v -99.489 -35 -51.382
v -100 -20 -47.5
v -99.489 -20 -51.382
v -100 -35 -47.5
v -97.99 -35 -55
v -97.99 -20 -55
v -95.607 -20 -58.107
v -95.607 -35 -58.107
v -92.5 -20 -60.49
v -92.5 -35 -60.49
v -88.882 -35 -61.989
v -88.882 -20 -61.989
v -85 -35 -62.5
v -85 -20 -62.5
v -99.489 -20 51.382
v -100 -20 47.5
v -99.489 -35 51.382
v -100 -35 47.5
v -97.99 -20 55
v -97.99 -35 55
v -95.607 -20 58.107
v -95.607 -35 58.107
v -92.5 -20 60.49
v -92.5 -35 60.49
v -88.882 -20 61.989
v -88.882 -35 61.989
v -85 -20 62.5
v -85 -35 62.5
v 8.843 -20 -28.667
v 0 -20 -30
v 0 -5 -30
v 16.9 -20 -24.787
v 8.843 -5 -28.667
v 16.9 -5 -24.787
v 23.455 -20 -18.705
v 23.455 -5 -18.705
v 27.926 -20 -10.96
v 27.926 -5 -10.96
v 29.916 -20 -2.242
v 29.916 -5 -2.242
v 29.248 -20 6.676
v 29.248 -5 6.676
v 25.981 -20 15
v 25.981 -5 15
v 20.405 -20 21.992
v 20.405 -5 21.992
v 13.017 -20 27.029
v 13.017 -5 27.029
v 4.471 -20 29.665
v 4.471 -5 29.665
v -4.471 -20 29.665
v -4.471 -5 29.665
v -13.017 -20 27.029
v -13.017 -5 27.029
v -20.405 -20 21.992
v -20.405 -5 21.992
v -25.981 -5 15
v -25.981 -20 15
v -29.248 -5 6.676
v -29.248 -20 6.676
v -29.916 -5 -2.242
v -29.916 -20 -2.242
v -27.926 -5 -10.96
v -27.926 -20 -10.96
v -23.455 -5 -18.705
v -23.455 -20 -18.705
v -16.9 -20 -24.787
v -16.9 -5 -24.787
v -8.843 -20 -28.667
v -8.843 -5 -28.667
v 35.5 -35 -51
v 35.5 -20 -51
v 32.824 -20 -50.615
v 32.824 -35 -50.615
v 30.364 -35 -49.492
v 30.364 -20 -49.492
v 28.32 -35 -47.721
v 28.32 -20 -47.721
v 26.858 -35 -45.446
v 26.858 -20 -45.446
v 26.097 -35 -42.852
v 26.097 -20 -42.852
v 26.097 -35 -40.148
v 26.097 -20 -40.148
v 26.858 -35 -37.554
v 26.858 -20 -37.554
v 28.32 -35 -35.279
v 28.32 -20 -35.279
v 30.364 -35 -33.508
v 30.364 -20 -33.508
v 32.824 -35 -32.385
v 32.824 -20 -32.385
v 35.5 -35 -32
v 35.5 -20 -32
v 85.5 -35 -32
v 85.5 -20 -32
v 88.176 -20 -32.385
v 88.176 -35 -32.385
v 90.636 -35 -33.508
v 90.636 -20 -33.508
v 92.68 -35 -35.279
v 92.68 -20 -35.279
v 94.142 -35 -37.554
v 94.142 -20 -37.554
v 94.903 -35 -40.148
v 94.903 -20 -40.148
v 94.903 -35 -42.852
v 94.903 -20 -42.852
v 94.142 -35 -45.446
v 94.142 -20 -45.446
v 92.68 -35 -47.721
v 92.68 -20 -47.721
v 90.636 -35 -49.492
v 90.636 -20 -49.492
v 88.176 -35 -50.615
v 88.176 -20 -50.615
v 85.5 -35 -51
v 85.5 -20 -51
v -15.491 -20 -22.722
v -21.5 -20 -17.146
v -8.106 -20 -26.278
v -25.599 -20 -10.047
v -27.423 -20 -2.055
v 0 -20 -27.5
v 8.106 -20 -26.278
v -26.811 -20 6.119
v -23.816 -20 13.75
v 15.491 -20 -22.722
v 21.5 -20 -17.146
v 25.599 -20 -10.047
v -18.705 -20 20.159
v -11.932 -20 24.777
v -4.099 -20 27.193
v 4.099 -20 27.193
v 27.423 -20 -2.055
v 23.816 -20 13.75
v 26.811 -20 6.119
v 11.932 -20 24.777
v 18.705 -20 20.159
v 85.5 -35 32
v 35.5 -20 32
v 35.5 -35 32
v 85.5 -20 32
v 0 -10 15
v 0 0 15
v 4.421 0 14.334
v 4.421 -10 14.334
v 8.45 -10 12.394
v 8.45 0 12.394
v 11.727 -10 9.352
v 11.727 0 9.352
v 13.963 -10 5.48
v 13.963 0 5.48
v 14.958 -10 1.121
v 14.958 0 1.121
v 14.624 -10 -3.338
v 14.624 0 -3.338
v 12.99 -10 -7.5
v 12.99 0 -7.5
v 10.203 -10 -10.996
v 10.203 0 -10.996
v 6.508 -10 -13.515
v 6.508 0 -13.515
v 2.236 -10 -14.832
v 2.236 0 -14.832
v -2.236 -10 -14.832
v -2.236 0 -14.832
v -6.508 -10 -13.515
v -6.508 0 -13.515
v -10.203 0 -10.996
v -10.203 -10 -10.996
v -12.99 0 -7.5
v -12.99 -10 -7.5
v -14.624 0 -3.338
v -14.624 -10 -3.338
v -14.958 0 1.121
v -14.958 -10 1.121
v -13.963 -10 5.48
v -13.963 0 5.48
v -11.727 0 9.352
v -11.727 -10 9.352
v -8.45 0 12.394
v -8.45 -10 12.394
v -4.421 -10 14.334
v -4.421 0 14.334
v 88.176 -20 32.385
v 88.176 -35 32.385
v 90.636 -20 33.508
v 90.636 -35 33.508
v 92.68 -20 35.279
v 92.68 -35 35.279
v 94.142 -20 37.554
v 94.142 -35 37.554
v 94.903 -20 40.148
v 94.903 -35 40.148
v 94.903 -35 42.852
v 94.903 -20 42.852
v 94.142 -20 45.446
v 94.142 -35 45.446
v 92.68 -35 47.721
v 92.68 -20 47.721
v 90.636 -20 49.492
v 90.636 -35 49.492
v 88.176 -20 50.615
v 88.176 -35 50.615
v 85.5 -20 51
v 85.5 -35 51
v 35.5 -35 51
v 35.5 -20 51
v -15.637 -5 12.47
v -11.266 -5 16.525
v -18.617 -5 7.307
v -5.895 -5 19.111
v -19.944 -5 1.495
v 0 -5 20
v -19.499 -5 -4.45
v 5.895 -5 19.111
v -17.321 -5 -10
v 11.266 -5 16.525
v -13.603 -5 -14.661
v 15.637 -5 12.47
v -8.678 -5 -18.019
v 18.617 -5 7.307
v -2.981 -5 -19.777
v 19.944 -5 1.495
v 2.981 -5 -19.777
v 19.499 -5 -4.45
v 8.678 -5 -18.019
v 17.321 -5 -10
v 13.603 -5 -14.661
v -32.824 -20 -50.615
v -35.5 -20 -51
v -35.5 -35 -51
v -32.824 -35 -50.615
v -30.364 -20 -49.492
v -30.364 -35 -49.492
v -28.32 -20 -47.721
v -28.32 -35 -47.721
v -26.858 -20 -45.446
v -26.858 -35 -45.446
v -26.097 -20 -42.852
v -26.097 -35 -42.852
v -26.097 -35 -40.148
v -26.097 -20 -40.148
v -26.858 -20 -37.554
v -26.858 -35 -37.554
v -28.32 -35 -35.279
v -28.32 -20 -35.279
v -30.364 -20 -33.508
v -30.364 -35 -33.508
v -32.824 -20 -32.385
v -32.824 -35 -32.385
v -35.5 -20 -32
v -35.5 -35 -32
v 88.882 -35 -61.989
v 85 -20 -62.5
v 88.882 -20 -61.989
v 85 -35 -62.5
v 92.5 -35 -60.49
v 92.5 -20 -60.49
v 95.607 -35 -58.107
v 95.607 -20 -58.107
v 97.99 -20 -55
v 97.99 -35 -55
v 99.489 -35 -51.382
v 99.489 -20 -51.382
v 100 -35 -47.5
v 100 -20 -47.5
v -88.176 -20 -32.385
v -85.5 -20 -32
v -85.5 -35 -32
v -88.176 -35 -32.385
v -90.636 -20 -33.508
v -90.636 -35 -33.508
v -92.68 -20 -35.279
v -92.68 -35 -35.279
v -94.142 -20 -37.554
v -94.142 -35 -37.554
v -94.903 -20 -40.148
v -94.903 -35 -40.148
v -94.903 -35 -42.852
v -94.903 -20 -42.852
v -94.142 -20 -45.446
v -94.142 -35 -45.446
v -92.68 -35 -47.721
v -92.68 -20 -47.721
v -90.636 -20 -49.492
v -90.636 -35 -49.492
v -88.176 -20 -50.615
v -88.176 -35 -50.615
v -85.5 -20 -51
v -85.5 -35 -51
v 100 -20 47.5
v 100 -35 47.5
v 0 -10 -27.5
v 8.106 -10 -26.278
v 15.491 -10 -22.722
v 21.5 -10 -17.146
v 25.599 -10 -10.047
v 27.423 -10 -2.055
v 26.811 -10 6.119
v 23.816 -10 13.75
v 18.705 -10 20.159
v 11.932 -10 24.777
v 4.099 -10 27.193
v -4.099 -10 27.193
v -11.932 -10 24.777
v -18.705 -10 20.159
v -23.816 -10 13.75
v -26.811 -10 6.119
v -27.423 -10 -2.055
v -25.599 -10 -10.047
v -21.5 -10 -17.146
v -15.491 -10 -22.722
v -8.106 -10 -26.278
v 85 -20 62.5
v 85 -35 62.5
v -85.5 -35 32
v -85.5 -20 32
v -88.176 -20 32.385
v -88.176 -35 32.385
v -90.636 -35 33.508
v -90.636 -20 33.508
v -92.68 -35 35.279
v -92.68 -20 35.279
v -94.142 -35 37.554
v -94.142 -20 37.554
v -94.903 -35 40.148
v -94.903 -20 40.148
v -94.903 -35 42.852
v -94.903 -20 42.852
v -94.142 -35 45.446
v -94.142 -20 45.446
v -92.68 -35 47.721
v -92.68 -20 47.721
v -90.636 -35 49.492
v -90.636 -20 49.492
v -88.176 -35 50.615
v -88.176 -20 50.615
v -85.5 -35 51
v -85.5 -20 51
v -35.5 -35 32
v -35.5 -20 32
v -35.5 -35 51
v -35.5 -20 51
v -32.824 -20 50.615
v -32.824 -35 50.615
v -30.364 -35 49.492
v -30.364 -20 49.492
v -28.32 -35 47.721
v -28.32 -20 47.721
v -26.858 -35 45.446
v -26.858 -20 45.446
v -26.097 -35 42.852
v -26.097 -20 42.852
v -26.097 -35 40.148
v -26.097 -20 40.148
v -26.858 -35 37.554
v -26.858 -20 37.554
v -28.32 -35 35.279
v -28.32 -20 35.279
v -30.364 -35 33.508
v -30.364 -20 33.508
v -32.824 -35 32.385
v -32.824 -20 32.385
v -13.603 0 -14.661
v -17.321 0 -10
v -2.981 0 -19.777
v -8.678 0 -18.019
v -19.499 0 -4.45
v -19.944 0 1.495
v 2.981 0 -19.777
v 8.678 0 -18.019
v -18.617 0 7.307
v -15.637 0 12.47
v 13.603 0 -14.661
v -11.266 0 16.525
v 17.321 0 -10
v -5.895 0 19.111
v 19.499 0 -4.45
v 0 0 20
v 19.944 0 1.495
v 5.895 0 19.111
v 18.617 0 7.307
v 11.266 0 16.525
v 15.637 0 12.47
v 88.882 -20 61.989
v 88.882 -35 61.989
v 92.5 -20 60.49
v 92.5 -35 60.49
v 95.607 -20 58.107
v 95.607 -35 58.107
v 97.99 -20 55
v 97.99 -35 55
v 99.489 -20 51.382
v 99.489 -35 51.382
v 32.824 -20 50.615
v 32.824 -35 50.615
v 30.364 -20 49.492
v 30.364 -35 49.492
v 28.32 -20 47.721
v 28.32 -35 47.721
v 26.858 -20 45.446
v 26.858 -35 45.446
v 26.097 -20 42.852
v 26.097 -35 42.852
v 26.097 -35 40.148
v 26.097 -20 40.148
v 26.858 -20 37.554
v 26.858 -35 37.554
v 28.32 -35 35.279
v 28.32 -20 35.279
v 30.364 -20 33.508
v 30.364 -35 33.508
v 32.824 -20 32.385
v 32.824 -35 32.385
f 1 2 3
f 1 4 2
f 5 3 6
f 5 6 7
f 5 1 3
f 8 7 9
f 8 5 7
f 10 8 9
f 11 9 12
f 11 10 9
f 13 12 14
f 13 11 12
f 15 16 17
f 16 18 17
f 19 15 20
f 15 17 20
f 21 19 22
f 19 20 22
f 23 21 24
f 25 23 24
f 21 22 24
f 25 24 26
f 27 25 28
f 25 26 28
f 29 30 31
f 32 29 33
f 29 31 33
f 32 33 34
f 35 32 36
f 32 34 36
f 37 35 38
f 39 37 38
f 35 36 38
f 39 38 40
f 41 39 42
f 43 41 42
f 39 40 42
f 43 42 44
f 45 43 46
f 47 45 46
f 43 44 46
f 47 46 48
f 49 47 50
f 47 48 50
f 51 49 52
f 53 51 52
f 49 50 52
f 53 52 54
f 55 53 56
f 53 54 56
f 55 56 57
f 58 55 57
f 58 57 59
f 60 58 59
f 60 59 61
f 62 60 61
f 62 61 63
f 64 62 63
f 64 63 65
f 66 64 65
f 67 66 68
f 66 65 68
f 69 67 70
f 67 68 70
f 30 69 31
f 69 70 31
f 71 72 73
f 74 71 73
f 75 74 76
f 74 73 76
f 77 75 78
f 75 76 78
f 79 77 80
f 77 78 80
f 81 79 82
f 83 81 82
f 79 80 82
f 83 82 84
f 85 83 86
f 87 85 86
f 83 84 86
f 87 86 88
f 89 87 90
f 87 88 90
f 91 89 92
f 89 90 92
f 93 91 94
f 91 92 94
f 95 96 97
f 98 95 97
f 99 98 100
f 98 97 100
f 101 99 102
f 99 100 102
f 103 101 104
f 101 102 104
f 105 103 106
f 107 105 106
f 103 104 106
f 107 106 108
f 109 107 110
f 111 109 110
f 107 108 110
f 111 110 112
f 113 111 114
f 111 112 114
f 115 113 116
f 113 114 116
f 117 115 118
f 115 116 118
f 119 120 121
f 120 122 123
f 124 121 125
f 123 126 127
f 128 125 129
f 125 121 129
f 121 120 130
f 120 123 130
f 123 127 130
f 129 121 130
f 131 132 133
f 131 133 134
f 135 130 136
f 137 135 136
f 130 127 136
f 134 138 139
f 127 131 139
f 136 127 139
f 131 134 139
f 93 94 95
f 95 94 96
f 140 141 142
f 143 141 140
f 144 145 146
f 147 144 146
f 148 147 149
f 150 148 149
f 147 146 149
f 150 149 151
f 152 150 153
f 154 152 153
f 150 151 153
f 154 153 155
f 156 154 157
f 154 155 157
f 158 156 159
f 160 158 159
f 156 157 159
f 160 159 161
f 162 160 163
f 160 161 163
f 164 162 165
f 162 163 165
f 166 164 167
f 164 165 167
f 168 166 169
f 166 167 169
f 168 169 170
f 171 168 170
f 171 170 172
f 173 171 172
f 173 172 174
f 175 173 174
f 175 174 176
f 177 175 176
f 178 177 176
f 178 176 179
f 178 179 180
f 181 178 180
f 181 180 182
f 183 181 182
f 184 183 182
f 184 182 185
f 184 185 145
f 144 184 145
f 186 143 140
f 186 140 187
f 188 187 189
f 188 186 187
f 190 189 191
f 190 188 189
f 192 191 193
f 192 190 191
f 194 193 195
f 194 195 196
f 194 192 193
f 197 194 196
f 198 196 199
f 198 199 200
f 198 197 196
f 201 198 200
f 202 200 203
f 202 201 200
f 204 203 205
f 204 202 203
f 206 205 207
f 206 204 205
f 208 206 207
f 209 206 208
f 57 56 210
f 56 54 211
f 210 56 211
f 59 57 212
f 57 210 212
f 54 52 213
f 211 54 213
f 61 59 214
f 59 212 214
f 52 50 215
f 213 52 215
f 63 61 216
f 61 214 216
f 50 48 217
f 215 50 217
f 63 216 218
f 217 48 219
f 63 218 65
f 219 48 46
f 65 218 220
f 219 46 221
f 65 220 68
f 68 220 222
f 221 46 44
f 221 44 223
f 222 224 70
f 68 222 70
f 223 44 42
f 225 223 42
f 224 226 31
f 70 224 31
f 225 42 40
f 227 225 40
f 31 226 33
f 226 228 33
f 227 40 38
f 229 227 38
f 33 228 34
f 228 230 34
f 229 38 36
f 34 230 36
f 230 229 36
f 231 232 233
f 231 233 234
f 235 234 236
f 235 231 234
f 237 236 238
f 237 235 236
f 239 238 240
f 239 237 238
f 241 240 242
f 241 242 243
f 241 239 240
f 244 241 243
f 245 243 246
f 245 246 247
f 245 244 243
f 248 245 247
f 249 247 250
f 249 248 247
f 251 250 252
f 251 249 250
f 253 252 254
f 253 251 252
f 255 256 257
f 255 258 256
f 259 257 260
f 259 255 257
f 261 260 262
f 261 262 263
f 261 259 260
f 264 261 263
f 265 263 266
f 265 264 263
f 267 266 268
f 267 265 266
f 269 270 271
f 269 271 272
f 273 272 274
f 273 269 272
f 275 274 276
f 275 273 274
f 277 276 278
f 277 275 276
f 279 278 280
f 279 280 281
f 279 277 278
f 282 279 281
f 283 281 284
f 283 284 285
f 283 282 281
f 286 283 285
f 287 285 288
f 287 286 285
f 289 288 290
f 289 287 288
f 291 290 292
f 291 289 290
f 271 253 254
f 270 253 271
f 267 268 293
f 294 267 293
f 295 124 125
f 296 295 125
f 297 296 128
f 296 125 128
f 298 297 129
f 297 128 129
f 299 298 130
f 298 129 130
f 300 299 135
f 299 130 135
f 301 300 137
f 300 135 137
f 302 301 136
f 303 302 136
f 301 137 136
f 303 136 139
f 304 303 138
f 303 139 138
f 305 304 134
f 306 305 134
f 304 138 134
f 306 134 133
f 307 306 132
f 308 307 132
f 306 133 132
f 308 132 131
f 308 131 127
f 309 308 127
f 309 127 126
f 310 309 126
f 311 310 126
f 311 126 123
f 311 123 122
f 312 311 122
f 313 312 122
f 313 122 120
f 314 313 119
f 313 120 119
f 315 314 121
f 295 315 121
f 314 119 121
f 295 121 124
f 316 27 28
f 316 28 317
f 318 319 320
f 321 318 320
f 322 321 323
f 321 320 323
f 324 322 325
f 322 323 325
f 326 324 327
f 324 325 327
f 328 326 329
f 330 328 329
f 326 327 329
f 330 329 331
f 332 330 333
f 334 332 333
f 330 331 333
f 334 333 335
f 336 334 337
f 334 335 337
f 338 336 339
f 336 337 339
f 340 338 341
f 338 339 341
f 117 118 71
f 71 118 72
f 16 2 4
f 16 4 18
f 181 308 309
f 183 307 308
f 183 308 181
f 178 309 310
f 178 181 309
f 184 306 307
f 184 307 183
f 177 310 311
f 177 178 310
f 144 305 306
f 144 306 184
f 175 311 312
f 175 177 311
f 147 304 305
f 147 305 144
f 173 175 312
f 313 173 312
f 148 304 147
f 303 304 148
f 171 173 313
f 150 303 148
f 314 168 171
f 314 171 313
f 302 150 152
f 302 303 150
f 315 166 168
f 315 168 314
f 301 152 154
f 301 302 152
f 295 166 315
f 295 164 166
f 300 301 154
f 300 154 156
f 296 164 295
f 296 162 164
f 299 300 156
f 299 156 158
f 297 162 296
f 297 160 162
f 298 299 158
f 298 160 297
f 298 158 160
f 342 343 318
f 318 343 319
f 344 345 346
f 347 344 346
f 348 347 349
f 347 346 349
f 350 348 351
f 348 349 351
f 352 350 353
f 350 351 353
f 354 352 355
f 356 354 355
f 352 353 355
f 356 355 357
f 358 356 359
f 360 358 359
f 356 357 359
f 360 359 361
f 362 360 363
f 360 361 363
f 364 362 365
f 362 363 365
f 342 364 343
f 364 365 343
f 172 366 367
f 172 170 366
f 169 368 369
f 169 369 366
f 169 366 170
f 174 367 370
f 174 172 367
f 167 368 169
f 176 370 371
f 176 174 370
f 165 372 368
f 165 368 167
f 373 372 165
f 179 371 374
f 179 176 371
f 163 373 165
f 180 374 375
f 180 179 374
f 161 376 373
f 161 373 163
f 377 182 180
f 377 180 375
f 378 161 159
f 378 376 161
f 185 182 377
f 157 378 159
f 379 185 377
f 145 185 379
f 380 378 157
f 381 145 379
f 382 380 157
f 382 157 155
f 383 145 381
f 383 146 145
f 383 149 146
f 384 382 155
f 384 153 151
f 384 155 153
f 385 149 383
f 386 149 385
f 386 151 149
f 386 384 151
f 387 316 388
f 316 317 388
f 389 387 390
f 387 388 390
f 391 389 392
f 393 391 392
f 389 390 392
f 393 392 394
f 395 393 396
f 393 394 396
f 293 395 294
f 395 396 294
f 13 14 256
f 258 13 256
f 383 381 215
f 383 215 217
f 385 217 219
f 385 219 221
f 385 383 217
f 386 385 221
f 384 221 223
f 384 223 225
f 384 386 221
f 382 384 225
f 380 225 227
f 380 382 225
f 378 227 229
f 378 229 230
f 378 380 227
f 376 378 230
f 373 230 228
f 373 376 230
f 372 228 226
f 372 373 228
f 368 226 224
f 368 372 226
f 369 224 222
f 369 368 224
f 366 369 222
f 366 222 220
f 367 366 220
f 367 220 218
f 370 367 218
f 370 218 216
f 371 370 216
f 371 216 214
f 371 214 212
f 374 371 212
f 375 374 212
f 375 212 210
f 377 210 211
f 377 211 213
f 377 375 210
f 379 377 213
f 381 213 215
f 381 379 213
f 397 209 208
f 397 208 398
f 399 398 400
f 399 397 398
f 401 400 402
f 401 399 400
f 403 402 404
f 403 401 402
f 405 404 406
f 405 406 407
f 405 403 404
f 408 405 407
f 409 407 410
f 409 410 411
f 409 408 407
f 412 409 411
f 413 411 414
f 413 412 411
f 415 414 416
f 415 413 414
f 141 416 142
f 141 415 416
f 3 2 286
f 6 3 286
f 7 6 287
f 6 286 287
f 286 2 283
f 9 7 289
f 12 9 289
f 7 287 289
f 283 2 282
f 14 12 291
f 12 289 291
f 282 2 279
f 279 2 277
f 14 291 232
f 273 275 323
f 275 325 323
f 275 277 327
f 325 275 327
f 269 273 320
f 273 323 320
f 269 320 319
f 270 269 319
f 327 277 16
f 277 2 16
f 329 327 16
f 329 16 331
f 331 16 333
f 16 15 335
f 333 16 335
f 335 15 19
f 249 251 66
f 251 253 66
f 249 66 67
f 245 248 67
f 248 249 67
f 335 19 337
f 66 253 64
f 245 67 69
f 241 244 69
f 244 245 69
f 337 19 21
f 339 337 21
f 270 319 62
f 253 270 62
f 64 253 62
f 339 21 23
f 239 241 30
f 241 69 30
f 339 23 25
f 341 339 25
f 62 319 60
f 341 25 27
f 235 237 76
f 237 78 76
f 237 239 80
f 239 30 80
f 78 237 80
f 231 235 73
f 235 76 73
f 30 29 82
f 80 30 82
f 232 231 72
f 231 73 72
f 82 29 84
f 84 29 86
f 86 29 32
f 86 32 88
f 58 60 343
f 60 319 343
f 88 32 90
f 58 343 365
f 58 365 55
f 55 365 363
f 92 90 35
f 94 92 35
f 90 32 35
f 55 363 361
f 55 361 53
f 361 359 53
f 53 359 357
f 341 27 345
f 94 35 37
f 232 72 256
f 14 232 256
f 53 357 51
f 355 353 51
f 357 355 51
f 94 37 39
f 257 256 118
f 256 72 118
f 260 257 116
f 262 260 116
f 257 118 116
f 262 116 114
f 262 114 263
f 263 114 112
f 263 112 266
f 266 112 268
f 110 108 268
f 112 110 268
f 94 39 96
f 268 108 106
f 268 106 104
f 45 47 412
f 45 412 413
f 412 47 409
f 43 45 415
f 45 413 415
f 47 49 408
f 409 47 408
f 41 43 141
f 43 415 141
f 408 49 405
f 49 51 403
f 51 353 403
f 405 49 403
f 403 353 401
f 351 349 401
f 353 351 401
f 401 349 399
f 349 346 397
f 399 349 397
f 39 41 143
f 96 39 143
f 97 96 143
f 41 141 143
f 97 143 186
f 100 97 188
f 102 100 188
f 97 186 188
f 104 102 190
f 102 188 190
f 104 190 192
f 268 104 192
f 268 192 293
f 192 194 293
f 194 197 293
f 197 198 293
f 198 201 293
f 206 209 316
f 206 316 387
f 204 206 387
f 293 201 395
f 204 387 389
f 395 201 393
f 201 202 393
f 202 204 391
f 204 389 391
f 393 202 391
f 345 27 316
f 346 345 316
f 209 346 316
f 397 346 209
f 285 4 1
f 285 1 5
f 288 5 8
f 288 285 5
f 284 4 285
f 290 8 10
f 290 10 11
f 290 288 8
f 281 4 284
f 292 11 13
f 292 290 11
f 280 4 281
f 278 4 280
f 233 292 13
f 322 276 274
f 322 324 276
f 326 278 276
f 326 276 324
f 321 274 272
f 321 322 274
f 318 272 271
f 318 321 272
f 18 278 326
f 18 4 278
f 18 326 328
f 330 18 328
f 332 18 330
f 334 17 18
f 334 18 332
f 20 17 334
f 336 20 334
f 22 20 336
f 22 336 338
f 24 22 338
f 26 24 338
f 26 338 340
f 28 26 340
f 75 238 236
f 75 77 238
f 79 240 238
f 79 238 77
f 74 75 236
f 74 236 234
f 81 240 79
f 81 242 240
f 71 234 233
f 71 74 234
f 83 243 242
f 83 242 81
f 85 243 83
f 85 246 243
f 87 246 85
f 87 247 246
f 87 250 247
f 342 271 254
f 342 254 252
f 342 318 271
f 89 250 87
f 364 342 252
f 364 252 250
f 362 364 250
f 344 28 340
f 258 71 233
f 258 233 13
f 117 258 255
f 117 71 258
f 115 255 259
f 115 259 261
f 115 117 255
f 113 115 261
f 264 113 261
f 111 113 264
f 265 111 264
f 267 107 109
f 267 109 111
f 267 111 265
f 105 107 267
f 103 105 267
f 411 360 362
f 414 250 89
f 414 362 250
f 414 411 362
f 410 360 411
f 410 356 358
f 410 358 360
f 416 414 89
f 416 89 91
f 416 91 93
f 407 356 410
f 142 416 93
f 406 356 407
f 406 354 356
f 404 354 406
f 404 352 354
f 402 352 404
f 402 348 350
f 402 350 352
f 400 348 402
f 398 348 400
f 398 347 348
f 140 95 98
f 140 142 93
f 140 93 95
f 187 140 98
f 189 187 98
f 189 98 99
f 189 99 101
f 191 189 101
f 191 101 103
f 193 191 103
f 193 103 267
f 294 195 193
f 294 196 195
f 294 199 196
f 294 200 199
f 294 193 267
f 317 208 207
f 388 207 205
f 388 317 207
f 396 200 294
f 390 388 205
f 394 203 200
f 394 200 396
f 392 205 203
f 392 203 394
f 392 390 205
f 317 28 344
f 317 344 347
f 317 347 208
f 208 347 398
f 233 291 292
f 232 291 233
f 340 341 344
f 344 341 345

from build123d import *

# Parameters (mm, degrees)
SKETCH1_R           = 20
SKETCH1_R_2         = 15
BOSS_EXTRUDE1_DEPTH = 5
SKETCH2_R           = 30
SKETCH2_R_2         = 15
BOSS_EXTRUDE2_DEPTH = 15
SKETCH3_R           = 27.5
CUT_EXTRUDE1_DEPTH  = 10
SKETCH4_W           = 200
SKETCH4_H           = 125
BOSS_EXTRUDE3_DEPTH = 15
FILLET1_R           = 15


with BuildPart() as part:
    # Sketch1 → Boss-Extrude1 (new body)
    with BuildSketch(Plane(origin=(0, 0, 0), x_dir=(1, 0, 0), z_dir=(0, 1, 0))):
        with Locations(Location((0, 0, 0), (0, 0, 270))):
            Circle(SKETCH1_R)
        with Locations(Location((0, 0, 0), (0, 0, 270))):
            Circle(SKETCH1_R_2, mode=Mode.SUBTRACT)
    extrude(amount=-BOSS_EXTRUDE1_DEPTH)

    # Sketch2 → Boss-Extrude2 (add)
    with BuildSketch(Plane.XZ.offset(5)):
        with Locations(Location((0, 0, 0), (0, 0, 270))):
            Circle(SKETCH2_R)
        with Locations(Location((0, 0, 0), (0, 0, 90))):
            Circle(SKETCH2_R_2, mode=Mode.SUBTRACT)
    extrude(amount=BOSS_EXTRUDE2_DEPTH)

    # Sketch3 → Cut-Extrude1 (cut)
    with BuildSketch(Plane.XZ.offset(20)):
        with Locations(Location((0, 0, 0), (0, 0, 270))):
            Circle(SKETCH3_R)
    extrude(amount=-CUT_EXTRUDE1_DEPTH, mode=Mode.SUBTRACT)

    # Sketch4 → Boss-Extrude3 (add)
    with BuildSketch(Plane.XZ.offset(20)):
        Rectangle(SKETCH4_W, SKETCH4_H)
        with BuildLine():
            Line((-85.5, 51), (-35.5, 51))
            ThreePointArc((-35.5, 51), (-26, 41.5), (-35.5, 32))
            Line((-35.5, 32), (-85.5, 32))
            ThreePointArc((-85.5, 32), (-95, 41.5), (-85.5, 51))
        make_face(mode=Mode.SUBTRACT)
        with BuildLine():
            Line((-85.5, -51), (-35.5, -51))
            ThreePointArc((-35.5, -51), (-26, -41.5), (-35.5, -32))
            Line((-35.5, -32), (-85.5, -32))
            ThreePointArc((-85.5, -32), (-95, -41.5), (-85.5, -51))
        make_face(mode=Mode.SUBTRACT)
        with BuildLine():
            Line((85.5, 51), (35.5, 51))
            ThreePointArc((35.5, 51), (26, 41.5), (35.5, 32))
            Line((35.5, 32), (85.5, 32))
            ThreePointArc((85.5, 32), (95, 41.5), (85.5, 51))
        make_face(mode=Mode.SUBTRACT)
        with BuildLine():
            Line((85.5, -51), (35.5, -51))
            ThreePointArc((35.5, -51), (26, -41.5), (35.5, -32))
            Line((35.5, -32), (85.5, -32))
            ThreePointArc((85.5, -32), (95, -41.5), (85.5, -51))
        make_face(mode=Mode.SUBTRACT)
    extrude(amount=BOSS_EXTRUDE3_DEPTH)

    # Fillet1
    fillet1_edges = [part.edges().sort_by_distance(p)[0] for p in [
        (100, -27.5, 62.5),
        (-100, -27.5, 62.5),
        (-100, -27.5, -62.5),
        (100, -27.5, -62.5),
    ]]
    fillet(fillet1_edges, radius=FILLET1_R)


solid = part.part
